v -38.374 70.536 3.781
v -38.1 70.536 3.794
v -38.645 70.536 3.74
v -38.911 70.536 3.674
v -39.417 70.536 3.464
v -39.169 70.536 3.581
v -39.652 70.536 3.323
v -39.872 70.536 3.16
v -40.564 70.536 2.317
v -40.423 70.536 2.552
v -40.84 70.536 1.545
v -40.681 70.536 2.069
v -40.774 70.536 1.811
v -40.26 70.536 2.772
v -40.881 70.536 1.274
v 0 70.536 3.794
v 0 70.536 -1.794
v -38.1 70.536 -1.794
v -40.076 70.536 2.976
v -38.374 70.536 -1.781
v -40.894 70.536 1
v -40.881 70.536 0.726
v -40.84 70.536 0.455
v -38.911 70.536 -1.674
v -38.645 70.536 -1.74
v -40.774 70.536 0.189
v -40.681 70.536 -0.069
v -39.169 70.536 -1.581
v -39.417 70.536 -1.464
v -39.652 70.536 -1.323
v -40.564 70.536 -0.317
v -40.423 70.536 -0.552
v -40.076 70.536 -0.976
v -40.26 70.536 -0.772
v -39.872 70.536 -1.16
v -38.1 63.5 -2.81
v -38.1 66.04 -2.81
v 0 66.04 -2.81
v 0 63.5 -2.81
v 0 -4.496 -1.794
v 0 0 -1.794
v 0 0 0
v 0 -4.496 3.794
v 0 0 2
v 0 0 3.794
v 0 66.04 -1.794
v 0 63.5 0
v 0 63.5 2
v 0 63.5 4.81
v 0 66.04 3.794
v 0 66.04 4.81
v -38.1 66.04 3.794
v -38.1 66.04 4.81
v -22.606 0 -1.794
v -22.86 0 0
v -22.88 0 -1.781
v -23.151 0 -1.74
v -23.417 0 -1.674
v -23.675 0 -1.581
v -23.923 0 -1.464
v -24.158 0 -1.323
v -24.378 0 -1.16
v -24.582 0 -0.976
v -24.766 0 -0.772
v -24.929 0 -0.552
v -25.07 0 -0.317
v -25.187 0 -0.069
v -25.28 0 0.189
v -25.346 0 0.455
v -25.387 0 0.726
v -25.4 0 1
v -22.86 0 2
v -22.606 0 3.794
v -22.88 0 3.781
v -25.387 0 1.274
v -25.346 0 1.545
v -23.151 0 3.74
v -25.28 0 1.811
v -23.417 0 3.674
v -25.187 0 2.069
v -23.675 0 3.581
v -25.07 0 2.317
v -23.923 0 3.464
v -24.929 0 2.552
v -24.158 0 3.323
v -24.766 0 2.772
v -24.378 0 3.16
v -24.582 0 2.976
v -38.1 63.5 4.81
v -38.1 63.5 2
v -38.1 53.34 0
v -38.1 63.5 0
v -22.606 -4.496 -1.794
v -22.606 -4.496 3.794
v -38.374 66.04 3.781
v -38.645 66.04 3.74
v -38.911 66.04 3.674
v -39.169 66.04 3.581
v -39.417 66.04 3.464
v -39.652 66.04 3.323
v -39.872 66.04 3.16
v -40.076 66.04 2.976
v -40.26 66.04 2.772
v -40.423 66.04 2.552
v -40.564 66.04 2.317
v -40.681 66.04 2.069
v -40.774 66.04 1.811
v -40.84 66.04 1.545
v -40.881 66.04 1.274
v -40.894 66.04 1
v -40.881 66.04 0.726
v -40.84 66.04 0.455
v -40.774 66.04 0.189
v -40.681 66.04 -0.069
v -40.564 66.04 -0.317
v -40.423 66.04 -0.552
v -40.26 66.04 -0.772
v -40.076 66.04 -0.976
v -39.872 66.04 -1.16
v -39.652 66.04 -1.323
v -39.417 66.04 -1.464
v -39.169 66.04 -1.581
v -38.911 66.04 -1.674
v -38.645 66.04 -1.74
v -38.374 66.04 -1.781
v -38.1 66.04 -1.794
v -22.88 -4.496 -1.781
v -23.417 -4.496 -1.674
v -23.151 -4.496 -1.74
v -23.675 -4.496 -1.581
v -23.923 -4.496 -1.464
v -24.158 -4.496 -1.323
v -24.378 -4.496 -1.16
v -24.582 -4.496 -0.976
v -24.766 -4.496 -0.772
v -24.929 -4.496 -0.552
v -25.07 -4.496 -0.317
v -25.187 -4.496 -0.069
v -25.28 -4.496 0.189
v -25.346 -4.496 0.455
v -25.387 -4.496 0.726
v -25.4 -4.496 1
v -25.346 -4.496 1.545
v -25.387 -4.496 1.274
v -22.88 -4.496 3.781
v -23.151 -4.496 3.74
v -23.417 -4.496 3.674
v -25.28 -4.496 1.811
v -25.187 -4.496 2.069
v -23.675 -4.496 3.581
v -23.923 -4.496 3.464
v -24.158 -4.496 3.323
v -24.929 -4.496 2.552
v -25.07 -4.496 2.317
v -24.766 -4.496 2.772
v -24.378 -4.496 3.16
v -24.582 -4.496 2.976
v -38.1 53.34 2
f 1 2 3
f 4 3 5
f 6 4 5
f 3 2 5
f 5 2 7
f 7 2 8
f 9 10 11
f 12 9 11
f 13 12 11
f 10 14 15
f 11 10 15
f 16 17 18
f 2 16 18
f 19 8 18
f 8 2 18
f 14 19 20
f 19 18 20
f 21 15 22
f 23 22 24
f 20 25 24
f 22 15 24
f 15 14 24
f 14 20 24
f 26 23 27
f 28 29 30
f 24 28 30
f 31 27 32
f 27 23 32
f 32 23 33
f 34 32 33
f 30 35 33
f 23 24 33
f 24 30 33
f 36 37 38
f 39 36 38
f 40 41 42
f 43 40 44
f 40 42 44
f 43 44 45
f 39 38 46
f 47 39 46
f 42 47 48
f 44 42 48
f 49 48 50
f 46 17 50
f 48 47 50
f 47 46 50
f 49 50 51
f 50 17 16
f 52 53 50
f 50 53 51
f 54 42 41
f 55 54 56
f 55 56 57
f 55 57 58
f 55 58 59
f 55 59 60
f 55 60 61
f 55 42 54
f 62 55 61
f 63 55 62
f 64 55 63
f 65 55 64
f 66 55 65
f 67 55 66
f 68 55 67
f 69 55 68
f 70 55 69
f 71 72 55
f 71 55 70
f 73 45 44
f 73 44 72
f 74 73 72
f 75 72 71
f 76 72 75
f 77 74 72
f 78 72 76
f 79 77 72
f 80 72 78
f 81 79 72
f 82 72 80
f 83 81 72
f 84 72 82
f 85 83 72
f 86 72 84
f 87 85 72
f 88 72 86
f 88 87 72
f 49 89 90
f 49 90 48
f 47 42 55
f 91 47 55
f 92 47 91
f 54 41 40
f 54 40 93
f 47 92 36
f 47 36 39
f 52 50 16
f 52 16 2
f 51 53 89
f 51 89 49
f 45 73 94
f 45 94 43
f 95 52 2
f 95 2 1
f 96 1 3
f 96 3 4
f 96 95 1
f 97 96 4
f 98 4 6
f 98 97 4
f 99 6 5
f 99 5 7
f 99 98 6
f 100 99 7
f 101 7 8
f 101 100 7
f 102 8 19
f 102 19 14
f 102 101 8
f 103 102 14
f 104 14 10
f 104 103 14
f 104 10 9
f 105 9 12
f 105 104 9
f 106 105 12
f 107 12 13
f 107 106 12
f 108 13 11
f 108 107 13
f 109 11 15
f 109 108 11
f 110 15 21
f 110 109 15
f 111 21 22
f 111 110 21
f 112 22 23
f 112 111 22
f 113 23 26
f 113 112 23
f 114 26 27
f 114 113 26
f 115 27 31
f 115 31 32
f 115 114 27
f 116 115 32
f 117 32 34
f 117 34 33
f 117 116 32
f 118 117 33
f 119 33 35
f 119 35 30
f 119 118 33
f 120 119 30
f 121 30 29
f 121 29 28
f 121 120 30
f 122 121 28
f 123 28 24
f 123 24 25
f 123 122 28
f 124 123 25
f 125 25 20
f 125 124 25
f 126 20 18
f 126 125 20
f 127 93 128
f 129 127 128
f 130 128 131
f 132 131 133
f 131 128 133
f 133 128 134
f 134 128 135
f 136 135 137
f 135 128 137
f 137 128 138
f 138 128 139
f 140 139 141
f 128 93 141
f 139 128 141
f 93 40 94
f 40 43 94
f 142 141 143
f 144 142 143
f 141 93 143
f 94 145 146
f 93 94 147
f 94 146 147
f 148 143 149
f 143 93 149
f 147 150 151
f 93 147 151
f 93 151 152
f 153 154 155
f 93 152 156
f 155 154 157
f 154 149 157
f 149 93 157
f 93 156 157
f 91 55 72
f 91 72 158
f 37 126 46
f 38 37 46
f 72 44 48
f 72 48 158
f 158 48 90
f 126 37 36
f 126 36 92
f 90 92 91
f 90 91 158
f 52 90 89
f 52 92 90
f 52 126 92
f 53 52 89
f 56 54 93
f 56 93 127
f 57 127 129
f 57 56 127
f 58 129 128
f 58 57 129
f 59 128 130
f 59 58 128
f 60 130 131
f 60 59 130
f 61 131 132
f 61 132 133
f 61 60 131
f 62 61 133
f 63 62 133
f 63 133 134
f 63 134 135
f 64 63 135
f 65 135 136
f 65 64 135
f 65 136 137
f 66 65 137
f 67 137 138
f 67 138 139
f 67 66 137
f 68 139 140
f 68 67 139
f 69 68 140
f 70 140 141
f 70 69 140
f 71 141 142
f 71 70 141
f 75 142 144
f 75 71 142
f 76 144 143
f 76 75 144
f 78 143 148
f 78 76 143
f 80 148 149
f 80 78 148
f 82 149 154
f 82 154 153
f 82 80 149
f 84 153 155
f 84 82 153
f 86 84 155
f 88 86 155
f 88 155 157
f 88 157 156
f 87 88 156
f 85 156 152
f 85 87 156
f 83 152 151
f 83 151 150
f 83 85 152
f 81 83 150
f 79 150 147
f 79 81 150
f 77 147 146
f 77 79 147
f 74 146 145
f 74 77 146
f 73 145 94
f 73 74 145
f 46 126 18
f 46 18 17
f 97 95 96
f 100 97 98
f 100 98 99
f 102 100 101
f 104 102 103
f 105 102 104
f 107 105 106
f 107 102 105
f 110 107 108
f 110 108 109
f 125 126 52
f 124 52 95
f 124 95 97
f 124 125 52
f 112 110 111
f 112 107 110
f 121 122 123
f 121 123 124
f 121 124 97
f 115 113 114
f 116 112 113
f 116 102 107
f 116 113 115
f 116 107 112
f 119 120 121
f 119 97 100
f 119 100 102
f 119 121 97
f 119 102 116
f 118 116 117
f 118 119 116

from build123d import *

# Parameters (mm, degrees)
BOSS_EXTRUDE1_DEPTH = 2.000000064
BOSS_EXTRUDE2_DEPTH = 4.4958
BOSS_EXTRUDE3_DEPTH = 4.4958
SKETCH4_W           = 38.1
SKETCH4_H           = 7.62
BOSS_EXTRUDE4_DEPTH = 2.54


with BuildPart() as part:
    # Sketch1 → Boss-Extrude1 (new body)
    with BuildSketch(Plane.XY):
        Polygon((0, 0), (-22.86, 0), (-38.1, 53.34), (-38.1, 66.04), (0, 66.04), align=None)
    extrude(amount=BOSS_EXTRUDE1_DEPTH)

    # Sketch2 → Boss-Extrude2 (add)
    with BuildSketch(Plane.XZ):
        with BuildLine():
            Line((0, -1.793999968), (-22.606, -1.793999968))
            ThreePointArc((-22.606, -1.793999968), (-25.4, 1.000000032), (-22.606, 3.794000032))
            Line((-22.606, 3.794000032), (0, 3.794000032))
            Line((0, 3.794000032), (0, -1.793999968))
        make_face()
    extrude(amount=BOSS_EXTRUDE2_DEPTH)

    # Sketch3 → Boss-Extrude3 (add)
    with BuildSketch(Plane(origin=(0, 66.04, 0), x_dir=(1, 0, 0), z_dir=(0, 1, 0))):
        with BuildLine():
            Line((0, 1.793999968), (0, -3.794000032))
            Line((0, -3.794000032), (-38.1, -3.794000032))
            ThreePointArc((-38.1, -3.794000032), (-40.894, -1.000000032), (-38.1, 1.793999968))
            Line((-38.1, 1.793999968), (0, 1.793999968))
        make_face()
    extrude(amount=BOSS_EXTRUDE3_DEPTH)

    # Sketch4 → Boss-Extrude4 (add)
    with BuildSketch(Plane.XZ.offset(-66.04)):
        with Locations((-19.05, 1.000000032)):
            Rectangle(SKETCH4_W, SKETCH4_H)
    extrude(amount=BOSS_EXTRUDE4_DEPTH)


solid = part.part
